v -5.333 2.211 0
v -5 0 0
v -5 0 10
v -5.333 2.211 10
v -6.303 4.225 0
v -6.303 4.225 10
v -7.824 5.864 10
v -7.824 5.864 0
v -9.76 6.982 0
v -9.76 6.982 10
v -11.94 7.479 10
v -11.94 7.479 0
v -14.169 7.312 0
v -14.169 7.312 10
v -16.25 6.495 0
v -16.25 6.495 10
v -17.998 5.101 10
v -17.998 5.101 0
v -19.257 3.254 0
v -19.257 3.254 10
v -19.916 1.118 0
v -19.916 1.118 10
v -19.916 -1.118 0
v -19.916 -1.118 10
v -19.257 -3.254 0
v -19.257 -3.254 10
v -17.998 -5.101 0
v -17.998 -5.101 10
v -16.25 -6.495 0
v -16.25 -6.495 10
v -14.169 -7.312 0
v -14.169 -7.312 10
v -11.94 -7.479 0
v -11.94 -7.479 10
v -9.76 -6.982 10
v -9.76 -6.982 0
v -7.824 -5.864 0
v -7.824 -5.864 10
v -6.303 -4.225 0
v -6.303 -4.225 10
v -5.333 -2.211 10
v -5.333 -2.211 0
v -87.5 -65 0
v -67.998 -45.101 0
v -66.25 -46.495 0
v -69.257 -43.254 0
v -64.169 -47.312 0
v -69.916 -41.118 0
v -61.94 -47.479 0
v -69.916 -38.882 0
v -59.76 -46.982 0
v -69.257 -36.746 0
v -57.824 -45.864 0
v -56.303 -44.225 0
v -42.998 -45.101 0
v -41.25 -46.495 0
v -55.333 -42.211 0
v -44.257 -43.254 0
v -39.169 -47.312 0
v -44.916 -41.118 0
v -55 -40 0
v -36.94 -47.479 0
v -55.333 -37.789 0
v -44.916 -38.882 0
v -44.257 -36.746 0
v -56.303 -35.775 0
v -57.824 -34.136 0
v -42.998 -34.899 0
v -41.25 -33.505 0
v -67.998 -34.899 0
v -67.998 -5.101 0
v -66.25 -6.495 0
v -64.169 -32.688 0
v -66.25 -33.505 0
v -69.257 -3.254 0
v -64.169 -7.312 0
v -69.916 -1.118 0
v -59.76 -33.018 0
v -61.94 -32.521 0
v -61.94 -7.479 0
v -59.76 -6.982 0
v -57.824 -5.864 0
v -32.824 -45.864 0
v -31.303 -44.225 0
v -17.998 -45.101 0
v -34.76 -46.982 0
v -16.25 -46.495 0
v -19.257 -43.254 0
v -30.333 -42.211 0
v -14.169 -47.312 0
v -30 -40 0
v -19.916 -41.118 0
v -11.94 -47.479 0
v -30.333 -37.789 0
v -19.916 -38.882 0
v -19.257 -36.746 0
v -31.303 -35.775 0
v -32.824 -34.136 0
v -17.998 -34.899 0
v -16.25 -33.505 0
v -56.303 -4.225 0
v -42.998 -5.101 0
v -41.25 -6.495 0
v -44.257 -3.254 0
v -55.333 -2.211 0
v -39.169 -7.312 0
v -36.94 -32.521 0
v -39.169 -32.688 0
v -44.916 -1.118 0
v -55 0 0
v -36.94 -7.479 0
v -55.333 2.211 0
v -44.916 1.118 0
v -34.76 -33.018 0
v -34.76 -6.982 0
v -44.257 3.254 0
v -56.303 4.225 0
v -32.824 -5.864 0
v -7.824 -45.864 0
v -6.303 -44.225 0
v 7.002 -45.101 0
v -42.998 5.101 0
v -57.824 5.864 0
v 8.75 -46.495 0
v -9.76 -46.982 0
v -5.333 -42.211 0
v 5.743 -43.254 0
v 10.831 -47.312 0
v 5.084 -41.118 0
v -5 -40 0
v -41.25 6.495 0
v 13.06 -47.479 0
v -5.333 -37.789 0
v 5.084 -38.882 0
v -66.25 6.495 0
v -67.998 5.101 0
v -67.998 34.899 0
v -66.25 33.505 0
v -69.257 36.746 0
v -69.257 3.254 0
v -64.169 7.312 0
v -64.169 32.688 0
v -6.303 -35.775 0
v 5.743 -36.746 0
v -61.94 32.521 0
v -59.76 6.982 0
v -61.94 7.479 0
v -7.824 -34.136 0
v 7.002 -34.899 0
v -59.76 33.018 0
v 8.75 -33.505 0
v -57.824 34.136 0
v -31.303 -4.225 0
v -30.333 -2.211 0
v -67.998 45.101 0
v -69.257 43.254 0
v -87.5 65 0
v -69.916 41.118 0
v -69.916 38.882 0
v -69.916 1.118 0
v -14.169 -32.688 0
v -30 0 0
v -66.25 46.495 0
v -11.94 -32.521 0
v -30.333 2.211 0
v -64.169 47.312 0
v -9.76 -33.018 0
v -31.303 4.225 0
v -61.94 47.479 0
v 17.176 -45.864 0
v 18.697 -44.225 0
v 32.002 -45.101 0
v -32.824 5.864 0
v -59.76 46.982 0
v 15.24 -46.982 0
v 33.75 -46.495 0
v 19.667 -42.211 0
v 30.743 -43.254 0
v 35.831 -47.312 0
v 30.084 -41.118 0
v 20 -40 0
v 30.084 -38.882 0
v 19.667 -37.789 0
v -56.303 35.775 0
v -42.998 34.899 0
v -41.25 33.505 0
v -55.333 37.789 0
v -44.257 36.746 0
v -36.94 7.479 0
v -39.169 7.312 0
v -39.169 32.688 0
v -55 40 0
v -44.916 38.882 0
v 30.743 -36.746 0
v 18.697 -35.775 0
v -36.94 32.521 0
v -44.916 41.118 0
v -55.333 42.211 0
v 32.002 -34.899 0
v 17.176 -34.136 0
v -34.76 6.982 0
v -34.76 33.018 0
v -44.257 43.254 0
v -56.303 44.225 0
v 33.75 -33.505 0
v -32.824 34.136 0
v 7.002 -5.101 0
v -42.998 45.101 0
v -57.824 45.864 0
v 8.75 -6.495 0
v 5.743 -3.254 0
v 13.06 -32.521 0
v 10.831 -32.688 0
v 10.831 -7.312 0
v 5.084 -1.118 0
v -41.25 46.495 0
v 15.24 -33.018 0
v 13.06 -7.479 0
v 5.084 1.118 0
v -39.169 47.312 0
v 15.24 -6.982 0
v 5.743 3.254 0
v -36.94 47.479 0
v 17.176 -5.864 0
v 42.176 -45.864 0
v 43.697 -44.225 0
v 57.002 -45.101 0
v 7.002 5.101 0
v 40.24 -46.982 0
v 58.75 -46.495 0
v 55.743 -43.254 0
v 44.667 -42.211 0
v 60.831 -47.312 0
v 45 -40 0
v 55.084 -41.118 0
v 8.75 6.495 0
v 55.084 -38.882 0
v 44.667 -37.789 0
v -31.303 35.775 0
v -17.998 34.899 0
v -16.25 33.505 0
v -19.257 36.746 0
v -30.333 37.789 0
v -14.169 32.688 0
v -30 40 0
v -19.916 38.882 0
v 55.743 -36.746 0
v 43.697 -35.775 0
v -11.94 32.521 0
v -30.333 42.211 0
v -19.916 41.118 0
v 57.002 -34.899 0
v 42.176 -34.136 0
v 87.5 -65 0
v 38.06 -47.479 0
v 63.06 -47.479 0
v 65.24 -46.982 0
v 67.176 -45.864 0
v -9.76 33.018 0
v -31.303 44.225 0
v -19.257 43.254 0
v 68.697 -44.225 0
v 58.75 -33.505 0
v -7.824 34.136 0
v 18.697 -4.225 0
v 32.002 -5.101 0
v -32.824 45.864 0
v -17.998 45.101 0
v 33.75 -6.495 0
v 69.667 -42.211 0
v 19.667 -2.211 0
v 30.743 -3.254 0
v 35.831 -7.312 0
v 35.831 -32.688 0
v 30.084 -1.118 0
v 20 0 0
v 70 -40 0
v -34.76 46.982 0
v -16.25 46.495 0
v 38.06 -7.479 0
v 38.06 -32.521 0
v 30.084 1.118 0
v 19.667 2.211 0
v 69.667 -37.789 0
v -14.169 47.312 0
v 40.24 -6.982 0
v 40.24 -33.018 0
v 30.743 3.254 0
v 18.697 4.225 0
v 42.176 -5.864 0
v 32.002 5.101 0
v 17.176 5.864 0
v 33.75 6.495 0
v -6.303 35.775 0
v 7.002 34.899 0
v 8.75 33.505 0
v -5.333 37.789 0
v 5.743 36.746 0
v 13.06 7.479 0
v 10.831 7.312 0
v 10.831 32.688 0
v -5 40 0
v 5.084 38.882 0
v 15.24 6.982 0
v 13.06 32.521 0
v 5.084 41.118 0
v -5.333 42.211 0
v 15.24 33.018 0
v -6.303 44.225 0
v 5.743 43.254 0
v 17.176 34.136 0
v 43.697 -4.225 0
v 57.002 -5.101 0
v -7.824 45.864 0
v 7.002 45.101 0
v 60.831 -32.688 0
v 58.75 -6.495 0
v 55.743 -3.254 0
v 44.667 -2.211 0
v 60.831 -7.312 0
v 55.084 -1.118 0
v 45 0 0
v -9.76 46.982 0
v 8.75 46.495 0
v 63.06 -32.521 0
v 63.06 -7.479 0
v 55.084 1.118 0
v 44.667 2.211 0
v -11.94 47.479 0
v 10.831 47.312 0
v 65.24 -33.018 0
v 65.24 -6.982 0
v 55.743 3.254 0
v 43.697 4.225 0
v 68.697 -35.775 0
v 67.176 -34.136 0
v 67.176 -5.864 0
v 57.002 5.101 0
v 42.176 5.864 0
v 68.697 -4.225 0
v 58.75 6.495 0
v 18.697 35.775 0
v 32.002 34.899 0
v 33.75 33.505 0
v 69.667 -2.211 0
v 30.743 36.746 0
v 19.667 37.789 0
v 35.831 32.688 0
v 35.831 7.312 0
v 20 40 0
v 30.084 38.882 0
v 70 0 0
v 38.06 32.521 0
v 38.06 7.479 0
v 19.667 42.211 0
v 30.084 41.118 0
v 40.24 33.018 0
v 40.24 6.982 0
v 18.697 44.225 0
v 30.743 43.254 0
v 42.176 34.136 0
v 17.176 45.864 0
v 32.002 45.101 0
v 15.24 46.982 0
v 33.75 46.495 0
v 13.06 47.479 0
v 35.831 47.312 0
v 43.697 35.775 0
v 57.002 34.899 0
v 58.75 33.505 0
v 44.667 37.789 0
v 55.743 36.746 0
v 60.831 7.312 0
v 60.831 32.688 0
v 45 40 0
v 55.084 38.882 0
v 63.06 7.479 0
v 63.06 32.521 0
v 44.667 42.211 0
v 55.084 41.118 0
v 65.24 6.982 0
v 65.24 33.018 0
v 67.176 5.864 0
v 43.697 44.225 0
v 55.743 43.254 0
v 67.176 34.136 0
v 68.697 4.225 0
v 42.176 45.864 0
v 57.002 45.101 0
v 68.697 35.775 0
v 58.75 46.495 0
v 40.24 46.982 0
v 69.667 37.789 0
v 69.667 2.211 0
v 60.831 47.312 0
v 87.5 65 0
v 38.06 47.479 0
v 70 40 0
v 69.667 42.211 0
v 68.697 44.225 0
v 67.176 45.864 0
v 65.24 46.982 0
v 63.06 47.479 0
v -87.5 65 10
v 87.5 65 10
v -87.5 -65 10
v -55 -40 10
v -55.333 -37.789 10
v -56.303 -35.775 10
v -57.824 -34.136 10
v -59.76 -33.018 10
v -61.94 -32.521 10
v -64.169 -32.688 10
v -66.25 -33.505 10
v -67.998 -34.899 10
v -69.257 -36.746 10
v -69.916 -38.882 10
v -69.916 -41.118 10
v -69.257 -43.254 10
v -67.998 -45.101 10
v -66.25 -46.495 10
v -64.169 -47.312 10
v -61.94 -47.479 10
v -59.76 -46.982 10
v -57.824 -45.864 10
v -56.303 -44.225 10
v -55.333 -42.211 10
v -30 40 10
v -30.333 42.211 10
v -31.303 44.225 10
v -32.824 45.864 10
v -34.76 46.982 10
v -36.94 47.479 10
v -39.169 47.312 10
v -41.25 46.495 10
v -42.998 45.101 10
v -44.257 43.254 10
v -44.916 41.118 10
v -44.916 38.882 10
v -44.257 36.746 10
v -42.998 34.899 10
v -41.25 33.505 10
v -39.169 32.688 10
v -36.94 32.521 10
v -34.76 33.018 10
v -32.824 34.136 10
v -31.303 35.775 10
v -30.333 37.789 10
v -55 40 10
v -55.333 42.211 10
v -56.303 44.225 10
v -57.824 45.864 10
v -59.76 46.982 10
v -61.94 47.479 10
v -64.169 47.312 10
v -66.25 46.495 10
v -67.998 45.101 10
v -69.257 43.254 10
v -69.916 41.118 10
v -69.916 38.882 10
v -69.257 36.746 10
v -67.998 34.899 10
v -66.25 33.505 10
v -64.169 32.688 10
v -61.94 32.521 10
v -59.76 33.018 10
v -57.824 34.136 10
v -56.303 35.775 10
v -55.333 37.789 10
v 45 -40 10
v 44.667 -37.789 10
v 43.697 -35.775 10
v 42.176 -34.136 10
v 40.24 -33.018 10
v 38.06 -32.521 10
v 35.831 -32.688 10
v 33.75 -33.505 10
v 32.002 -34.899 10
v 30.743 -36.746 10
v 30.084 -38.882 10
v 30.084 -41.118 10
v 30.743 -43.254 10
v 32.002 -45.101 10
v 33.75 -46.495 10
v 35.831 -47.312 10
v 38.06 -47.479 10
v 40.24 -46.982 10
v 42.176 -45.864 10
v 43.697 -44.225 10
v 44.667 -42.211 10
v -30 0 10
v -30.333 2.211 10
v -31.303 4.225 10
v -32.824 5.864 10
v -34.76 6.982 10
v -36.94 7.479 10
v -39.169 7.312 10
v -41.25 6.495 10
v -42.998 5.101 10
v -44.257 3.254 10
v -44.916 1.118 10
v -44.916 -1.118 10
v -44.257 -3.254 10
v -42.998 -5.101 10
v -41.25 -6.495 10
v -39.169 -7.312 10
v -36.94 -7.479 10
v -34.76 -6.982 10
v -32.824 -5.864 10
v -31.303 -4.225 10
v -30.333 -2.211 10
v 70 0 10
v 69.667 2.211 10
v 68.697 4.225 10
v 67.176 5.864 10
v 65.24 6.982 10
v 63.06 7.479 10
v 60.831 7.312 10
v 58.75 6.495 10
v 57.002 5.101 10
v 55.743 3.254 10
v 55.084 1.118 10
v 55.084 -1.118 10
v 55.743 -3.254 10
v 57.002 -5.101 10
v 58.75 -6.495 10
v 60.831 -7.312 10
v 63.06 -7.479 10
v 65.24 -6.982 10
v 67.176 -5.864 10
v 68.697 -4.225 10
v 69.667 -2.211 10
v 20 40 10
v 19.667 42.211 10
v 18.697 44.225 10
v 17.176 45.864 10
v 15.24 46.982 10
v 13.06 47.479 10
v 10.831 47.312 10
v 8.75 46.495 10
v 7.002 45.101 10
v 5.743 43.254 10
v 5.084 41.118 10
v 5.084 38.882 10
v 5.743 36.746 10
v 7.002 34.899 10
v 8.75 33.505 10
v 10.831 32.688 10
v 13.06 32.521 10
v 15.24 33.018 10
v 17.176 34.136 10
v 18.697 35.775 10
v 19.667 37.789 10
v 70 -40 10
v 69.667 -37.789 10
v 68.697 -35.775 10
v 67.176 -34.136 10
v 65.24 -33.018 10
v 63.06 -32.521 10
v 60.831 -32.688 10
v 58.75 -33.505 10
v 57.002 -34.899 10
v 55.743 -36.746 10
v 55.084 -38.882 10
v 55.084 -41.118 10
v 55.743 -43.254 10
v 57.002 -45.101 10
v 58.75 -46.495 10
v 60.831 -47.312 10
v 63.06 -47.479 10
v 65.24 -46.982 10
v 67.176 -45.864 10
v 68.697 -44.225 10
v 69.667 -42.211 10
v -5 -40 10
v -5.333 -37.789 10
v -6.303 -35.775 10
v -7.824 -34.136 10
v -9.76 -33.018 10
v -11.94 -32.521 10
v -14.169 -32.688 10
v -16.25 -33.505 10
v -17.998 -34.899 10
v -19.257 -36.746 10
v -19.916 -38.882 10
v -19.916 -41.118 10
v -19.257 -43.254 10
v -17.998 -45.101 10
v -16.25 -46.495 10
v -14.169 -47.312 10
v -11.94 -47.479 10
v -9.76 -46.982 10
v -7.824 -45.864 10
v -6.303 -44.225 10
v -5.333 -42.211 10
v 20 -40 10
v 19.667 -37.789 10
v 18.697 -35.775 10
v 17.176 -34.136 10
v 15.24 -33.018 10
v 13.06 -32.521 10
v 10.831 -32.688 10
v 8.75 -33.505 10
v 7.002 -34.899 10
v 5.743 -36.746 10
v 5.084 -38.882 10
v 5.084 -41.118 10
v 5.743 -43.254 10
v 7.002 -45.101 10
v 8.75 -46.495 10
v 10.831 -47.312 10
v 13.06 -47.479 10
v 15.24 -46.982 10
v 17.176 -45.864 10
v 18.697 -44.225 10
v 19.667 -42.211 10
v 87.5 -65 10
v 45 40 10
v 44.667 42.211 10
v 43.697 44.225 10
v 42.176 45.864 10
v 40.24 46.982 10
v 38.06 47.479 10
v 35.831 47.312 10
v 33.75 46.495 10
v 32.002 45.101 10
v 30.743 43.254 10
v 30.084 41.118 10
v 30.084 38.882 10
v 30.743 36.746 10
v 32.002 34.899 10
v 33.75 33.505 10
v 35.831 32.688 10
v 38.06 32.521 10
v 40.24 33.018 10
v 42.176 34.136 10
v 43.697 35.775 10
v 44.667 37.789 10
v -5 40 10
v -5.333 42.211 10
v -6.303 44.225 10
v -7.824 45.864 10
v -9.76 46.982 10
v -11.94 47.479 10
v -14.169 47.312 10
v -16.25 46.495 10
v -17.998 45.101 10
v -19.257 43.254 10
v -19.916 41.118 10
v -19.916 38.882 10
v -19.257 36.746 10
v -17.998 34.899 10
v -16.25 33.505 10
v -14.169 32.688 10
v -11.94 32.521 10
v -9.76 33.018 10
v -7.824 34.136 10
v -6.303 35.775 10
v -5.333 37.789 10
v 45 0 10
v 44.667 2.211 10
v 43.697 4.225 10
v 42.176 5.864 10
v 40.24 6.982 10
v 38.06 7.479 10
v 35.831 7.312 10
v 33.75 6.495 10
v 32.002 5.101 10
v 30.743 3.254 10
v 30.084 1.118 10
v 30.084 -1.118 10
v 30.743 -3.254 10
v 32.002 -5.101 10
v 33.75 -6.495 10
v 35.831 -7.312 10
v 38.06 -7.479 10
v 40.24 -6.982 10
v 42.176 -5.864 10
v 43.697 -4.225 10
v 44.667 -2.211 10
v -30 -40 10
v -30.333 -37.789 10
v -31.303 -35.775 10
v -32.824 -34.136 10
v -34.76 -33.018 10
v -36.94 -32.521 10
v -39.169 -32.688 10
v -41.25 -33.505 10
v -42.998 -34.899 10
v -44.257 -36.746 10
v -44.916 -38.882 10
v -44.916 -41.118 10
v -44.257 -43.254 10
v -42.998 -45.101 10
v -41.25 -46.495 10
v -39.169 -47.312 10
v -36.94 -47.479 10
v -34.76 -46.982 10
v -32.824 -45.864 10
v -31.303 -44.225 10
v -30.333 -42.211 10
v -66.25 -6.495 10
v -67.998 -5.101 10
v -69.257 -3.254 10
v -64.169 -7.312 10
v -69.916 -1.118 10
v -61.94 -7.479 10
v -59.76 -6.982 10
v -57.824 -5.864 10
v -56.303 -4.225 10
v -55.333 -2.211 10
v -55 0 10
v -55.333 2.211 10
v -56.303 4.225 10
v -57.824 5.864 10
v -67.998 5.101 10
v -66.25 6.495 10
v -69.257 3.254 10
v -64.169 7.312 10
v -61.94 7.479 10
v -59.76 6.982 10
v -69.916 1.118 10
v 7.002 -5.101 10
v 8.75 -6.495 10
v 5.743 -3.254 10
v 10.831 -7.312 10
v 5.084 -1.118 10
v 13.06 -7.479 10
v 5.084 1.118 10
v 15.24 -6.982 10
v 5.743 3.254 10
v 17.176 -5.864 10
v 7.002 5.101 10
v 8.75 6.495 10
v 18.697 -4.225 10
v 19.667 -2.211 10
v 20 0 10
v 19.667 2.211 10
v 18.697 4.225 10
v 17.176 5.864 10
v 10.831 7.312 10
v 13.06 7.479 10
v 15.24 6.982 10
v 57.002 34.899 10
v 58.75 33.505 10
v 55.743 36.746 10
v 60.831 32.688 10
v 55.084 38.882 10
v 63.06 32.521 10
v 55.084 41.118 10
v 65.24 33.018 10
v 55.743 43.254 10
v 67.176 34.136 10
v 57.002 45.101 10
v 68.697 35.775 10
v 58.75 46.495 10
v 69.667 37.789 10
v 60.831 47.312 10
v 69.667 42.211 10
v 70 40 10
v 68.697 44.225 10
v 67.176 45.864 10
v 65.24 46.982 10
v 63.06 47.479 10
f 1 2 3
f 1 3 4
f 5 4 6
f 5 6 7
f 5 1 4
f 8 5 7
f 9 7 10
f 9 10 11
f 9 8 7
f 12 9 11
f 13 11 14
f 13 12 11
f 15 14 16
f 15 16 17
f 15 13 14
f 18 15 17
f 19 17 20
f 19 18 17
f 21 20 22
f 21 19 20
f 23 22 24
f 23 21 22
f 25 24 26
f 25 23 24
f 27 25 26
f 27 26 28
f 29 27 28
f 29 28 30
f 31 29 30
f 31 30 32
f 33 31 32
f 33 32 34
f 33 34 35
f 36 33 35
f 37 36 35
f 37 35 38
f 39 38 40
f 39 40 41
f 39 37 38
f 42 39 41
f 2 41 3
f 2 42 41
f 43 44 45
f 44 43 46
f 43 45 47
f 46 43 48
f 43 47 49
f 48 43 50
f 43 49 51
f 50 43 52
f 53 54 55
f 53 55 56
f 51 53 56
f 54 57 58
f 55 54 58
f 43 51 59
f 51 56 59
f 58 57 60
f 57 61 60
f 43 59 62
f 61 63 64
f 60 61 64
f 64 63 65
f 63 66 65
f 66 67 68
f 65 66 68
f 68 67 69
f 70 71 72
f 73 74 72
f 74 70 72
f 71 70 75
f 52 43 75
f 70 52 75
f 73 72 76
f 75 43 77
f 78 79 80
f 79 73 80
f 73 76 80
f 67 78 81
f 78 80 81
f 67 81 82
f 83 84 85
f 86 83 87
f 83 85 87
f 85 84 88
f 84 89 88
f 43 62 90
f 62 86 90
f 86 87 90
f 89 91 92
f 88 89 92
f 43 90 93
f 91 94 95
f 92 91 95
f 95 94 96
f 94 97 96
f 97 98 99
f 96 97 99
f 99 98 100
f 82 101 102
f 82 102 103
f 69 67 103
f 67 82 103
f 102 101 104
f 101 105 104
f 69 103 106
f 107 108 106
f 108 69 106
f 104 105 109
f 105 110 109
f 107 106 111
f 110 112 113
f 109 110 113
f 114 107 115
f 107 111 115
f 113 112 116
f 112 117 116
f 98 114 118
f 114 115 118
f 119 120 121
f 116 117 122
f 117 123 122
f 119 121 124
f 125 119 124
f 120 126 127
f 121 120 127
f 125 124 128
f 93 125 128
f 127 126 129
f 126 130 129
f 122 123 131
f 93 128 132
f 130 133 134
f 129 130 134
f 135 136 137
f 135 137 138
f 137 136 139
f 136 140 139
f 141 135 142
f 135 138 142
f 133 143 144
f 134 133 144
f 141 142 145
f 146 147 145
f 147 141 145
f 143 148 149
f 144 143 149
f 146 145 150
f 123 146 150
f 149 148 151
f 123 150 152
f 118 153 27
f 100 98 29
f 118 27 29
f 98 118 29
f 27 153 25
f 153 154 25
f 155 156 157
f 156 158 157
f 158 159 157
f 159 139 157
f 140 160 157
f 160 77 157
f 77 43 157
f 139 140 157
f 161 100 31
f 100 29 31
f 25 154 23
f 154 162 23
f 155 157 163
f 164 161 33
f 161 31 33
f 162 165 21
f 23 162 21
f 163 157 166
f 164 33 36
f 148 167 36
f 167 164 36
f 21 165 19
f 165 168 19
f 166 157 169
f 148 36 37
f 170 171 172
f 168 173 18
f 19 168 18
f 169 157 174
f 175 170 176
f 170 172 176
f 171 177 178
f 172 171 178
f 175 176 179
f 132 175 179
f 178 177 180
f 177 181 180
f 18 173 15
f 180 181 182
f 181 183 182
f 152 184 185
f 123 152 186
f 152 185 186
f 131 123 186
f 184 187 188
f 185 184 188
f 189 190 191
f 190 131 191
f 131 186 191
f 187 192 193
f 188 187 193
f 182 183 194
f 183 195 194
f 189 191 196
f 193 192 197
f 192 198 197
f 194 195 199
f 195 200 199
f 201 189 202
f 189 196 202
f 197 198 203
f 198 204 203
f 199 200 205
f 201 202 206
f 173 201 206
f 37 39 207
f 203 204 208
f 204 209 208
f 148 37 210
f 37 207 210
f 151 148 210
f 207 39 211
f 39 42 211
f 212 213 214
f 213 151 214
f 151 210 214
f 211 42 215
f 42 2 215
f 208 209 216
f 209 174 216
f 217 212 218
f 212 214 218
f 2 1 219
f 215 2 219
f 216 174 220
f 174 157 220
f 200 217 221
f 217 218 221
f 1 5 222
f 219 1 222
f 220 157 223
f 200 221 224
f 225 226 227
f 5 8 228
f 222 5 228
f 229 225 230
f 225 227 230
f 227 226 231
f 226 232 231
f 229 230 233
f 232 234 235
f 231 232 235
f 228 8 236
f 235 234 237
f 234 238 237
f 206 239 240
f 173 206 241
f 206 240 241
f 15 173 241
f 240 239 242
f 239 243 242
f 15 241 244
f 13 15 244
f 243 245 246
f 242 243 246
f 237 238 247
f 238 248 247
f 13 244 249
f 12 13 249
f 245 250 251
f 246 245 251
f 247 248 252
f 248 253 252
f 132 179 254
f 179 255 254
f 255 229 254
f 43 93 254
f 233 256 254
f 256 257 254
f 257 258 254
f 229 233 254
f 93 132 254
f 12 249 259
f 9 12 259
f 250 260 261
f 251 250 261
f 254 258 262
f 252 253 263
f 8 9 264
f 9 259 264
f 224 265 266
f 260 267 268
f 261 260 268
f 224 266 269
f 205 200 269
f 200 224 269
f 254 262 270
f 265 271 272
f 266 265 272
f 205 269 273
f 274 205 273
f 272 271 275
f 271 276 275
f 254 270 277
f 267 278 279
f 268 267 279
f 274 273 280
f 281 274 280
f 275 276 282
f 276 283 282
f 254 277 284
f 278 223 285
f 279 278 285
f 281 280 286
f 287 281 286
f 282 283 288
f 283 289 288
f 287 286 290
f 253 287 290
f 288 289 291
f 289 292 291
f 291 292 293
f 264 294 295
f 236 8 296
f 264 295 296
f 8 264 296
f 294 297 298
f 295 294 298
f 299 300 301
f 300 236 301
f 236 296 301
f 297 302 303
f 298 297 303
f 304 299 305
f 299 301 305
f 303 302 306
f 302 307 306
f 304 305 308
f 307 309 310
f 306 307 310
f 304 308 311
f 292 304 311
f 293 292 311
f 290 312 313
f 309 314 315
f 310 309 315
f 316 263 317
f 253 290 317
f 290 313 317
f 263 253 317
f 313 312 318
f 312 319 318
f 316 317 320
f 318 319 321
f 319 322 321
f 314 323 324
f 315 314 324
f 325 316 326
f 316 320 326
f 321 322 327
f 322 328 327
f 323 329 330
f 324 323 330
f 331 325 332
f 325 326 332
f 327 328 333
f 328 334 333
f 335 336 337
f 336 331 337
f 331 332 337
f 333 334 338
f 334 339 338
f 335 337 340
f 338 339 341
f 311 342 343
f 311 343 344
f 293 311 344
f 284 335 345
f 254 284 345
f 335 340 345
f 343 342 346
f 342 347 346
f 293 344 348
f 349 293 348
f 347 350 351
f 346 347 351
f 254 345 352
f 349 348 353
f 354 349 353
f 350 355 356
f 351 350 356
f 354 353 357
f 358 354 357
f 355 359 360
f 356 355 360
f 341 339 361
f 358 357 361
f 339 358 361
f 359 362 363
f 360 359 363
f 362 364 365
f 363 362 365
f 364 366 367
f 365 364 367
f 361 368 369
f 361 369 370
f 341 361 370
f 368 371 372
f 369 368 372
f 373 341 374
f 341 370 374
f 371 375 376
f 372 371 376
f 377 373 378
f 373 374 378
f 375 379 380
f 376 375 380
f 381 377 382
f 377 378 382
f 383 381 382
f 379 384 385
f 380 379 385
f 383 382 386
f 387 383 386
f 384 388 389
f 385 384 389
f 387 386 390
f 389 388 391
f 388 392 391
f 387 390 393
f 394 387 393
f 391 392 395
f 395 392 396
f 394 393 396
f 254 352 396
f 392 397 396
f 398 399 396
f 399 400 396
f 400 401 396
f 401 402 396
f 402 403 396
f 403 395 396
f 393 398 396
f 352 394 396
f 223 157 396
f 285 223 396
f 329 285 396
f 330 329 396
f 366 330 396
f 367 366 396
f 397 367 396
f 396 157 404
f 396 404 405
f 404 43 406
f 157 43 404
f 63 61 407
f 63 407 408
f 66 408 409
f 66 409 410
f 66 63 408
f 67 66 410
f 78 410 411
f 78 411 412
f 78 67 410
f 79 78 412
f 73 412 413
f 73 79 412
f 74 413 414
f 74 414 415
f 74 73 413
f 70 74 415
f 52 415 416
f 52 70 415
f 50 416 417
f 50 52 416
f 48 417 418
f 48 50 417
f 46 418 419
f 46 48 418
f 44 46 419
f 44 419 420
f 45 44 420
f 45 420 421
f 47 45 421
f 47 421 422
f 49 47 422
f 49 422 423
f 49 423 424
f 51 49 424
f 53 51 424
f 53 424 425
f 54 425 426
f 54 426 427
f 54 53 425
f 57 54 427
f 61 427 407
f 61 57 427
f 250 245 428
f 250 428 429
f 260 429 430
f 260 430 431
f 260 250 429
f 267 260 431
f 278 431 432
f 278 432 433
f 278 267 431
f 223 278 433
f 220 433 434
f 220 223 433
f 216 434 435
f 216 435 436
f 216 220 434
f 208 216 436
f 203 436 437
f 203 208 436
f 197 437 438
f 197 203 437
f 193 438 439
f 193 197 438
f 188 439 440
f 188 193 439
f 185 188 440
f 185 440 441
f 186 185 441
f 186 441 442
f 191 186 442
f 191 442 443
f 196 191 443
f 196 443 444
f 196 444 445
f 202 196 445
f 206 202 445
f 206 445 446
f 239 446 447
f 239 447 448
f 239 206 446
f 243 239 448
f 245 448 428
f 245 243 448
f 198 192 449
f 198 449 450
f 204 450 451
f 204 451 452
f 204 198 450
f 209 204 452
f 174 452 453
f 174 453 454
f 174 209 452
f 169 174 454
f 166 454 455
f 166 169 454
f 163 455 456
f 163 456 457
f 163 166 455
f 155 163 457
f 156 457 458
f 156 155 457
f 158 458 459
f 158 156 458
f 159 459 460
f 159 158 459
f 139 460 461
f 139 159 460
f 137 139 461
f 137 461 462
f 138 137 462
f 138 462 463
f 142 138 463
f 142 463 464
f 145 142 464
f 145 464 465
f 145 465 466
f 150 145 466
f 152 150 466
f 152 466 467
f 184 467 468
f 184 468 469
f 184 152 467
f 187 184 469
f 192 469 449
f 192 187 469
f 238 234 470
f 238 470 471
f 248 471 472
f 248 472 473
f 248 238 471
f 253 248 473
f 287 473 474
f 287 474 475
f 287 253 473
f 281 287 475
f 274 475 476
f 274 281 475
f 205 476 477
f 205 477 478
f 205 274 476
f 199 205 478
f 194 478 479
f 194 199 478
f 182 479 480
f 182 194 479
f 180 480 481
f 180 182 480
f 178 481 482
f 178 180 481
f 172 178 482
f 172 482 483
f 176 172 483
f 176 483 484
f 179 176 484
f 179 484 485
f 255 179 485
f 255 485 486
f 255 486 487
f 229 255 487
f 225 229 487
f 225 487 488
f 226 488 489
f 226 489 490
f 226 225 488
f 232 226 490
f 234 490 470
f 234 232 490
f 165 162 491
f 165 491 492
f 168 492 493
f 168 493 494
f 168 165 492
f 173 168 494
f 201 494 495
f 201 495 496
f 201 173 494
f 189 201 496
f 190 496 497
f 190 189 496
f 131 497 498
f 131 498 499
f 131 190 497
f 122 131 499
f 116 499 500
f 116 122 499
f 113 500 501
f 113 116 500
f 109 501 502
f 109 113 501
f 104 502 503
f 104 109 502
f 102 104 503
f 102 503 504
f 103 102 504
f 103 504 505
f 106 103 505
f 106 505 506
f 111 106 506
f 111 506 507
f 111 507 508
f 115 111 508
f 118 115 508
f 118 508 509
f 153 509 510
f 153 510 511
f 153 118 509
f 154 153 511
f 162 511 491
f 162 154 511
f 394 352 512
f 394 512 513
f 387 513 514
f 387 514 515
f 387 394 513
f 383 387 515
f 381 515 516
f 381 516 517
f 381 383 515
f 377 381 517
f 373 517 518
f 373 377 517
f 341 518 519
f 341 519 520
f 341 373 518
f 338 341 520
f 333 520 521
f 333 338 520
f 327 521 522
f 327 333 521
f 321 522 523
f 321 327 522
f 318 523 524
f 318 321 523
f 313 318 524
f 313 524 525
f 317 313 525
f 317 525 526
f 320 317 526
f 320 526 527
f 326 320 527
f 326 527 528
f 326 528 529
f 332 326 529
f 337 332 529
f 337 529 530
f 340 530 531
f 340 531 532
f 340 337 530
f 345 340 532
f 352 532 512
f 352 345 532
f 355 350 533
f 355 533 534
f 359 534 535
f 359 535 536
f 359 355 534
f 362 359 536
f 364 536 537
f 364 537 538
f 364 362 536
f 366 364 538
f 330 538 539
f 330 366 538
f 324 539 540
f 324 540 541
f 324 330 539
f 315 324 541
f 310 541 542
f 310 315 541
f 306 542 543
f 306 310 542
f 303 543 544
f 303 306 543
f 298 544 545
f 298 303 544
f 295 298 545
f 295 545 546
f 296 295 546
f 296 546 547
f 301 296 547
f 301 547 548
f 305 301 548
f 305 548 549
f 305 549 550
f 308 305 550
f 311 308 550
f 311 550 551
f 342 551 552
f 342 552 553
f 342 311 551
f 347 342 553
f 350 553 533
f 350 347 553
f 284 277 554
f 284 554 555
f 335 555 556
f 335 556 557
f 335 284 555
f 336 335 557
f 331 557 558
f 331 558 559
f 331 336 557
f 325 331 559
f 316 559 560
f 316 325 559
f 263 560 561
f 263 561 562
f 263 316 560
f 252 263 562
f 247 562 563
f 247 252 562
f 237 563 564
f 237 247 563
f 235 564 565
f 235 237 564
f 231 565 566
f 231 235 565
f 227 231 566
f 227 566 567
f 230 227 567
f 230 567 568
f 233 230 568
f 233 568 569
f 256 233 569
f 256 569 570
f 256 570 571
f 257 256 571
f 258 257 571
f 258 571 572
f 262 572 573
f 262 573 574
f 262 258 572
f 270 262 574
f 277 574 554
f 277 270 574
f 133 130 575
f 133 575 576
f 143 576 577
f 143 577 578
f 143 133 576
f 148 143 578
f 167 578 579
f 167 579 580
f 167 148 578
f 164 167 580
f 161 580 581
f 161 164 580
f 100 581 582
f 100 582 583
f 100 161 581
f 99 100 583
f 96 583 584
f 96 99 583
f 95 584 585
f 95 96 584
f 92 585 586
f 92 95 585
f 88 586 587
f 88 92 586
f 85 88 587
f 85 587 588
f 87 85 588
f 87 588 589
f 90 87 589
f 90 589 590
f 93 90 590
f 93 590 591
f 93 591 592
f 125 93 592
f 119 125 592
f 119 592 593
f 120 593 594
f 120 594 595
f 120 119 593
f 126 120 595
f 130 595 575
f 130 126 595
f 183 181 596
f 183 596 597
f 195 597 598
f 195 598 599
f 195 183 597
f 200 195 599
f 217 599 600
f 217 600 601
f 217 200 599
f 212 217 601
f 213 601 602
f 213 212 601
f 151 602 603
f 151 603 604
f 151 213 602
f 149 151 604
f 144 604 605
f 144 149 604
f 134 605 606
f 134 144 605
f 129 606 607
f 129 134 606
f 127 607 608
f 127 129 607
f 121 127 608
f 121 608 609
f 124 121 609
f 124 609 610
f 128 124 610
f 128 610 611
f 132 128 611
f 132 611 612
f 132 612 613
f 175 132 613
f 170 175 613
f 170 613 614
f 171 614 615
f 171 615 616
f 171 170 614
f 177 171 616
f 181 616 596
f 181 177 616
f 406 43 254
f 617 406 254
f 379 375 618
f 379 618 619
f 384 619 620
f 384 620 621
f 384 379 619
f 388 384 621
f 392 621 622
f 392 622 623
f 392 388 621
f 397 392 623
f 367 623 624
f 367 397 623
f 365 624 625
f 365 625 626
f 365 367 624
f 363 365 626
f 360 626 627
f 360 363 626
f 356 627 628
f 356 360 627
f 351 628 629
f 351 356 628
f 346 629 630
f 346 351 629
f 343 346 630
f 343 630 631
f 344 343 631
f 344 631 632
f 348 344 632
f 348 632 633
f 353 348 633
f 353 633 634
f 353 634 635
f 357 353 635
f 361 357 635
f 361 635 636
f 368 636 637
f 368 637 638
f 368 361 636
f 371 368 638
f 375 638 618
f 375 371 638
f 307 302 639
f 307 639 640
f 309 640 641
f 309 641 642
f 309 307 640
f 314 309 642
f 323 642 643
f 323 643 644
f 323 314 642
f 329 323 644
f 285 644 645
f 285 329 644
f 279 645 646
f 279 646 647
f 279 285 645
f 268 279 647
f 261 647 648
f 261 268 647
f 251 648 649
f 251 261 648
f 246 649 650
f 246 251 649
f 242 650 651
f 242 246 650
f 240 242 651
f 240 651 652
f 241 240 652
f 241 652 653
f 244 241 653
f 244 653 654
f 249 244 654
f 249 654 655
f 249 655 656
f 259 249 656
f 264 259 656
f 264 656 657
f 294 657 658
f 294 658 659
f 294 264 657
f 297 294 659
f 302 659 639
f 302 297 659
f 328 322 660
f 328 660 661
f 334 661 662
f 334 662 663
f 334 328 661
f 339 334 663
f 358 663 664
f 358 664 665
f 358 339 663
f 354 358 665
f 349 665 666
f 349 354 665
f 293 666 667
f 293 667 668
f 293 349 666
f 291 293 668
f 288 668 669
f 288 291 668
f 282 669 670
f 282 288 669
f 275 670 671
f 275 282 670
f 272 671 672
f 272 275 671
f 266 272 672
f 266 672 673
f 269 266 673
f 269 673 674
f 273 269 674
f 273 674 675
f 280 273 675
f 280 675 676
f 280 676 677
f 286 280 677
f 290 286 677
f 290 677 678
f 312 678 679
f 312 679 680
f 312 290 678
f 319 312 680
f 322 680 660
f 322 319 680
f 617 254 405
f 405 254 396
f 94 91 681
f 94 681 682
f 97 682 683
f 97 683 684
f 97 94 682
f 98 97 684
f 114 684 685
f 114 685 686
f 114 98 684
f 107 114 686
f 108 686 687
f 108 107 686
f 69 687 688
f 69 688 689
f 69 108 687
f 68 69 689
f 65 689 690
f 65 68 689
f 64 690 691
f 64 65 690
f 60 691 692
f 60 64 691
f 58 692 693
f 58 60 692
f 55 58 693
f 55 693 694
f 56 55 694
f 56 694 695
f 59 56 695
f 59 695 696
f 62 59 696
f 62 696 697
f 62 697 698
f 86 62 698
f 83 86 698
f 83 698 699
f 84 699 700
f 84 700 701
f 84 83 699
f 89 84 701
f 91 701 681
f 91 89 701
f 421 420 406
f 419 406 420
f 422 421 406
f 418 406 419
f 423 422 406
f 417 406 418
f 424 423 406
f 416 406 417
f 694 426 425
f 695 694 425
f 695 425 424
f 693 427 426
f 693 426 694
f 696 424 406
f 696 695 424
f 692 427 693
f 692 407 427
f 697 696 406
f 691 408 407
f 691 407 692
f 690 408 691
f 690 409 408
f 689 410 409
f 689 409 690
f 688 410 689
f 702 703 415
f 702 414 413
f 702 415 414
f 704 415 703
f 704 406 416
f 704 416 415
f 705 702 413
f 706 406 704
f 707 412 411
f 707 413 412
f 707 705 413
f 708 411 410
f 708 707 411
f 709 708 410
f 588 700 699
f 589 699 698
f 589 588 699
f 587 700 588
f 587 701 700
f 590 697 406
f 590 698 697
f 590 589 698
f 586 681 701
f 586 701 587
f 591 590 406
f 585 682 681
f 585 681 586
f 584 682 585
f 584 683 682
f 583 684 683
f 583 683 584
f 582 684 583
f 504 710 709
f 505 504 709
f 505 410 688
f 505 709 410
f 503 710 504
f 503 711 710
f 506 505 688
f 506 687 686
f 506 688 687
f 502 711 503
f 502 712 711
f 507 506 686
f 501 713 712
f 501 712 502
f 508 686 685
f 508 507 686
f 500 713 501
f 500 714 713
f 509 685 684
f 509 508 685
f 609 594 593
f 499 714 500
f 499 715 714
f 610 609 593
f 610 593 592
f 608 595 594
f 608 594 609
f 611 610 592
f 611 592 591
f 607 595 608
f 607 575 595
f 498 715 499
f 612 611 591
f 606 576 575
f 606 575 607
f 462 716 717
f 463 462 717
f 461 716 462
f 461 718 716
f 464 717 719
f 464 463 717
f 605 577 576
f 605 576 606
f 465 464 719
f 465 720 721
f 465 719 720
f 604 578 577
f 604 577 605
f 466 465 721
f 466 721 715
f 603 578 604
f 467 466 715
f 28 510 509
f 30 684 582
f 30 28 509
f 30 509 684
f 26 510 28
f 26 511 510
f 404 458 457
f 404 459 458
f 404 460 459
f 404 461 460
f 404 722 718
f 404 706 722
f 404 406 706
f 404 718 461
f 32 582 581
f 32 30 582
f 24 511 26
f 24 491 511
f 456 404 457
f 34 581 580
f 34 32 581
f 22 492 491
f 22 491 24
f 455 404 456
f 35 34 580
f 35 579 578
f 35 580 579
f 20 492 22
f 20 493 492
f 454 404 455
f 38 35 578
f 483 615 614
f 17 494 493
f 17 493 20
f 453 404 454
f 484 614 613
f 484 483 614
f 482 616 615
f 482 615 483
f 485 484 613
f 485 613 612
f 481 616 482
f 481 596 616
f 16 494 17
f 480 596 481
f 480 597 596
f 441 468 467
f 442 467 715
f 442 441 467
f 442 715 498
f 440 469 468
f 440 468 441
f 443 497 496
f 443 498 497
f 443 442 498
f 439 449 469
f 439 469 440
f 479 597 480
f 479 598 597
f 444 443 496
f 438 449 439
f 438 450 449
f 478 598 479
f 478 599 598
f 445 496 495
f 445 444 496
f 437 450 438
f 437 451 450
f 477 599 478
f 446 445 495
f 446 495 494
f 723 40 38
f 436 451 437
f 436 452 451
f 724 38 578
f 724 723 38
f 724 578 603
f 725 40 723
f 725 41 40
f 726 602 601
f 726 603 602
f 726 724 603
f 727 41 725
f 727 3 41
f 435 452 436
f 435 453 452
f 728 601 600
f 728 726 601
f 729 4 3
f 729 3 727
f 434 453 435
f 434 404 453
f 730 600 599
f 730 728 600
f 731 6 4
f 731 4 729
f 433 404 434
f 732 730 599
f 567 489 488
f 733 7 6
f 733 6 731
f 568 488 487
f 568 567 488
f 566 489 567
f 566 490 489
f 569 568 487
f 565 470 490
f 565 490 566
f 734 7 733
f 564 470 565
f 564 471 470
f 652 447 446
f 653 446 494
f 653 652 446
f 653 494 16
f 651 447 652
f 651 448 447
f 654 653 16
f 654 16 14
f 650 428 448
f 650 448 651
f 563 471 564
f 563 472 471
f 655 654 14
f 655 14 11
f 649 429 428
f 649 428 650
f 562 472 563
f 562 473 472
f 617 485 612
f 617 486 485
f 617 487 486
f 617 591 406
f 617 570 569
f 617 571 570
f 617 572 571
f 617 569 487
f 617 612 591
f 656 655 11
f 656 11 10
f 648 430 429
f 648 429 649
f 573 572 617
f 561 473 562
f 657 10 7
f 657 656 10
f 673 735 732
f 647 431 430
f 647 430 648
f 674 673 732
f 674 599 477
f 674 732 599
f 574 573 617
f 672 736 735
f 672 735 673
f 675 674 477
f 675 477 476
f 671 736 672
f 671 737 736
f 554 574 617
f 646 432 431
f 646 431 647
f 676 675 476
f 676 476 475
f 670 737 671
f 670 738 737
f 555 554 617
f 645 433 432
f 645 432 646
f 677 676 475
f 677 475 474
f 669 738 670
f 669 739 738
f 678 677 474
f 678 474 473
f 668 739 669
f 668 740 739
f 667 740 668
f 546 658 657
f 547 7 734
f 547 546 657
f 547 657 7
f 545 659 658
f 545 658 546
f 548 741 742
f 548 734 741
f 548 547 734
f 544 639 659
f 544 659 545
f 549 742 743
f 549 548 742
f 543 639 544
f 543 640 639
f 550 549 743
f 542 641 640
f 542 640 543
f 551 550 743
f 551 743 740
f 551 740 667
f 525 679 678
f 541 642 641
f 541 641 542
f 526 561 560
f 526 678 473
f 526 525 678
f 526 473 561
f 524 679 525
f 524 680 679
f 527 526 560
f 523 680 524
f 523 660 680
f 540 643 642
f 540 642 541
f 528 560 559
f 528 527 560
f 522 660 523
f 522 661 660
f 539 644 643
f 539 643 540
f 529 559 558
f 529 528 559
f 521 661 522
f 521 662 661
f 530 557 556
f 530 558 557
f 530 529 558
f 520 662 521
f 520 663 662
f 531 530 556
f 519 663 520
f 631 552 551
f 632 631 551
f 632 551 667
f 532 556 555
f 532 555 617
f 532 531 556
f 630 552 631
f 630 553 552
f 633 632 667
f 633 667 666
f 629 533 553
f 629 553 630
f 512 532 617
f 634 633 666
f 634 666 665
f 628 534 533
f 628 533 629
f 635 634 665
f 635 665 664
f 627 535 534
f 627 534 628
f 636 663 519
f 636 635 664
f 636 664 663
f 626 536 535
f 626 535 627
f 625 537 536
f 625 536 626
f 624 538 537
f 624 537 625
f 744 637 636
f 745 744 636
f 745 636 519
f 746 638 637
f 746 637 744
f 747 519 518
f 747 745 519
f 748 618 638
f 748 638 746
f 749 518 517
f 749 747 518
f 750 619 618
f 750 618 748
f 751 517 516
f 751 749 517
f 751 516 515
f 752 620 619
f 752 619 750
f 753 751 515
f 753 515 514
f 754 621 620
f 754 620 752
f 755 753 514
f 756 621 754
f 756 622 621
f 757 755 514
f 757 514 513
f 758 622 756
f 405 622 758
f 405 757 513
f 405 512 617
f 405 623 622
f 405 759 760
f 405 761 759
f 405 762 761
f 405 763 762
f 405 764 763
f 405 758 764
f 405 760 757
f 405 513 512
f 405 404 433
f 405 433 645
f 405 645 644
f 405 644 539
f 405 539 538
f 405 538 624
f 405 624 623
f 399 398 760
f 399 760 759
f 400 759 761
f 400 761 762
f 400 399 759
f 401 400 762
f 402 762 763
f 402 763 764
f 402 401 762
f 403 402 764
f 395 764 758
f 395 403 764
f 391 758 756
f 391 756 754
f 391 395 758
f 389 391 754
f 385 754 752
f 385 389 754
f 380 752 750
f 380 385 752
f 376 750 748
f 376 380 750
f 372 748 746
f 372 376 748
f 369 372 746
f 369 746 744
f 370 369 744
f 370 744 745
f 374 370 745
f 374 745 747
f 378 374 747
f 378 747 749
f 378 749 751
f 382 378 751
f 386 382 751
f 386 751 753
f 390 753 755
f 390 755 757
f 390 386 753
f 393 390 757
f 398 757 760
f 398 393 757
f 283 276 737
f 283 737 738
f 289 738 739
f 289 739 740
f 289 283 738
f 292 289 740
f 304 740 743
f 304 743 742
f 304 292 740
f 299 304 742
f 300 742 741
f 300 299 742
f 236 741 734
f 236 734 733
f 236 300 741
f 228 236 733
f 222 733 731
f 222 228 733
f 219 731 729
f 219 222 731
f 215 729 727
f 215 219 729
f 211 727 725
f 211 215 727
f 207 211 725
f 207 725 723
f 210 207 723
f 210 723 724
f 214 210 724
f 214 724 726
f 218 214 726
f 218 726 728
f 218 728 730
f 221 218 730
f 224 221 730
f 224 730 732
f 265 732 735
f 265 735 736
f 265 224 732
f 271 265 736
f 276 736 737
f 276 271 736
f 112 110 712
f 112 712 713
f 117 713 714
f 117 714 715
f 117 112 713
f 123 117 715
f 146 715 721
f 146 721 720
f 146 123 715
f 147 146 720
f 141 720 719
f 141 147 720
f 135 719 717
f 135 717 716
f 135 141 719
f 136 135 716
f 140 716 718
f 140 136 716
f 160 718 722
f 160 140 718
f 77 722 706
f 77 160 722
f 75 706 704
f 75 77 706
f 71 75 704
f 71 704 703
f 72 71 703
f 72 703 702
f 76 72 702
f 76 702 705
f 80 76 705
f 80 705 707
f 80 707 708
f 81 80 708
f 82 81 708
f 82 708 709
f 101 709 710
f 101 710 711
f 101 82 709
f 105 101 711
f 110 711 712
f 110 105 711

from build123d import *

# Parameters (mm, degrees)
F0_W     = 175
F0_H     = 130
F0_R     = 7.5
F1_DEPTH = 10


with BuildPart() as f1:
    # F0 (on Top) → F1 (new body)
    with BuildSketch(Plane.XY):
        Rectangle(F0_W, F0_H)
        with Locations((-62.5, -40)):
            Circle(F0_R, mode=Mode.SUBTRACT)
        with Locations((-37.5, -40)):
            Circle(F0_R, mode=Mode.SUBTRACT)
        with Locations((-12.5, -40)):
            Circle(F0_R, mode=Mode.SUBTRACT)
        with Locations((12.5, -40)):
            Circle(F0_R, mode=Mode.SUBTRACT)
        with Locations((37.5, -40)):
            Circle(F0_R, mode=Mode.SUBTRACT)
        with Locations((62.5, -40)):
            Circle(F0_R, mode=Mode.SUBTRACT)
        with Locations((-62.5, 0)):
            Circle(F0_R, mode=Mode.SUBTRACT)
        with Locations((-37.5, 0)):
            Circle(F0_R, mode=Mode.SUBTRACT)
        with Locations((-12.5, 0)):
            Circle(F0_R, mode=Mode.SUBTRACT)
        with Locations((-62.5, 40)):
            Circle(F0_R, mode=Mode.SUBTRACT)
        with Locations((-37.5, 40)):
            Circle(F0_R, mode=Mode.SUBTRACT)
        with Locations((-12.5, 40)):
            Circle(F0_R, mode=Mode.SUBTRACT)
        with Locations((12.5, 0)):
            Circle(F0_R, mode=Mode.SUBTRACT)
        with Locations((37.5, 0)):
            Circle(F0_R, mode=Mode.SUBTRACT)
        with Locations((62.5, 0)):
            Circle(F0_R, mode=Mode.SUBTRACT)
        with Locations((12.5, 40)):
            Circle(F0_R, mode=Mode.SUBTRACT)
        with Locations((37.5, 40)):
            Circle(F0_R, mode=Mode.SUBTRACT)
        with Locations((62.5, 40)):
            Circle(F0_R, mode=Mode.SUBTRACT)
    extrude(amount=F1_DEPTH)


solid = f1.part
